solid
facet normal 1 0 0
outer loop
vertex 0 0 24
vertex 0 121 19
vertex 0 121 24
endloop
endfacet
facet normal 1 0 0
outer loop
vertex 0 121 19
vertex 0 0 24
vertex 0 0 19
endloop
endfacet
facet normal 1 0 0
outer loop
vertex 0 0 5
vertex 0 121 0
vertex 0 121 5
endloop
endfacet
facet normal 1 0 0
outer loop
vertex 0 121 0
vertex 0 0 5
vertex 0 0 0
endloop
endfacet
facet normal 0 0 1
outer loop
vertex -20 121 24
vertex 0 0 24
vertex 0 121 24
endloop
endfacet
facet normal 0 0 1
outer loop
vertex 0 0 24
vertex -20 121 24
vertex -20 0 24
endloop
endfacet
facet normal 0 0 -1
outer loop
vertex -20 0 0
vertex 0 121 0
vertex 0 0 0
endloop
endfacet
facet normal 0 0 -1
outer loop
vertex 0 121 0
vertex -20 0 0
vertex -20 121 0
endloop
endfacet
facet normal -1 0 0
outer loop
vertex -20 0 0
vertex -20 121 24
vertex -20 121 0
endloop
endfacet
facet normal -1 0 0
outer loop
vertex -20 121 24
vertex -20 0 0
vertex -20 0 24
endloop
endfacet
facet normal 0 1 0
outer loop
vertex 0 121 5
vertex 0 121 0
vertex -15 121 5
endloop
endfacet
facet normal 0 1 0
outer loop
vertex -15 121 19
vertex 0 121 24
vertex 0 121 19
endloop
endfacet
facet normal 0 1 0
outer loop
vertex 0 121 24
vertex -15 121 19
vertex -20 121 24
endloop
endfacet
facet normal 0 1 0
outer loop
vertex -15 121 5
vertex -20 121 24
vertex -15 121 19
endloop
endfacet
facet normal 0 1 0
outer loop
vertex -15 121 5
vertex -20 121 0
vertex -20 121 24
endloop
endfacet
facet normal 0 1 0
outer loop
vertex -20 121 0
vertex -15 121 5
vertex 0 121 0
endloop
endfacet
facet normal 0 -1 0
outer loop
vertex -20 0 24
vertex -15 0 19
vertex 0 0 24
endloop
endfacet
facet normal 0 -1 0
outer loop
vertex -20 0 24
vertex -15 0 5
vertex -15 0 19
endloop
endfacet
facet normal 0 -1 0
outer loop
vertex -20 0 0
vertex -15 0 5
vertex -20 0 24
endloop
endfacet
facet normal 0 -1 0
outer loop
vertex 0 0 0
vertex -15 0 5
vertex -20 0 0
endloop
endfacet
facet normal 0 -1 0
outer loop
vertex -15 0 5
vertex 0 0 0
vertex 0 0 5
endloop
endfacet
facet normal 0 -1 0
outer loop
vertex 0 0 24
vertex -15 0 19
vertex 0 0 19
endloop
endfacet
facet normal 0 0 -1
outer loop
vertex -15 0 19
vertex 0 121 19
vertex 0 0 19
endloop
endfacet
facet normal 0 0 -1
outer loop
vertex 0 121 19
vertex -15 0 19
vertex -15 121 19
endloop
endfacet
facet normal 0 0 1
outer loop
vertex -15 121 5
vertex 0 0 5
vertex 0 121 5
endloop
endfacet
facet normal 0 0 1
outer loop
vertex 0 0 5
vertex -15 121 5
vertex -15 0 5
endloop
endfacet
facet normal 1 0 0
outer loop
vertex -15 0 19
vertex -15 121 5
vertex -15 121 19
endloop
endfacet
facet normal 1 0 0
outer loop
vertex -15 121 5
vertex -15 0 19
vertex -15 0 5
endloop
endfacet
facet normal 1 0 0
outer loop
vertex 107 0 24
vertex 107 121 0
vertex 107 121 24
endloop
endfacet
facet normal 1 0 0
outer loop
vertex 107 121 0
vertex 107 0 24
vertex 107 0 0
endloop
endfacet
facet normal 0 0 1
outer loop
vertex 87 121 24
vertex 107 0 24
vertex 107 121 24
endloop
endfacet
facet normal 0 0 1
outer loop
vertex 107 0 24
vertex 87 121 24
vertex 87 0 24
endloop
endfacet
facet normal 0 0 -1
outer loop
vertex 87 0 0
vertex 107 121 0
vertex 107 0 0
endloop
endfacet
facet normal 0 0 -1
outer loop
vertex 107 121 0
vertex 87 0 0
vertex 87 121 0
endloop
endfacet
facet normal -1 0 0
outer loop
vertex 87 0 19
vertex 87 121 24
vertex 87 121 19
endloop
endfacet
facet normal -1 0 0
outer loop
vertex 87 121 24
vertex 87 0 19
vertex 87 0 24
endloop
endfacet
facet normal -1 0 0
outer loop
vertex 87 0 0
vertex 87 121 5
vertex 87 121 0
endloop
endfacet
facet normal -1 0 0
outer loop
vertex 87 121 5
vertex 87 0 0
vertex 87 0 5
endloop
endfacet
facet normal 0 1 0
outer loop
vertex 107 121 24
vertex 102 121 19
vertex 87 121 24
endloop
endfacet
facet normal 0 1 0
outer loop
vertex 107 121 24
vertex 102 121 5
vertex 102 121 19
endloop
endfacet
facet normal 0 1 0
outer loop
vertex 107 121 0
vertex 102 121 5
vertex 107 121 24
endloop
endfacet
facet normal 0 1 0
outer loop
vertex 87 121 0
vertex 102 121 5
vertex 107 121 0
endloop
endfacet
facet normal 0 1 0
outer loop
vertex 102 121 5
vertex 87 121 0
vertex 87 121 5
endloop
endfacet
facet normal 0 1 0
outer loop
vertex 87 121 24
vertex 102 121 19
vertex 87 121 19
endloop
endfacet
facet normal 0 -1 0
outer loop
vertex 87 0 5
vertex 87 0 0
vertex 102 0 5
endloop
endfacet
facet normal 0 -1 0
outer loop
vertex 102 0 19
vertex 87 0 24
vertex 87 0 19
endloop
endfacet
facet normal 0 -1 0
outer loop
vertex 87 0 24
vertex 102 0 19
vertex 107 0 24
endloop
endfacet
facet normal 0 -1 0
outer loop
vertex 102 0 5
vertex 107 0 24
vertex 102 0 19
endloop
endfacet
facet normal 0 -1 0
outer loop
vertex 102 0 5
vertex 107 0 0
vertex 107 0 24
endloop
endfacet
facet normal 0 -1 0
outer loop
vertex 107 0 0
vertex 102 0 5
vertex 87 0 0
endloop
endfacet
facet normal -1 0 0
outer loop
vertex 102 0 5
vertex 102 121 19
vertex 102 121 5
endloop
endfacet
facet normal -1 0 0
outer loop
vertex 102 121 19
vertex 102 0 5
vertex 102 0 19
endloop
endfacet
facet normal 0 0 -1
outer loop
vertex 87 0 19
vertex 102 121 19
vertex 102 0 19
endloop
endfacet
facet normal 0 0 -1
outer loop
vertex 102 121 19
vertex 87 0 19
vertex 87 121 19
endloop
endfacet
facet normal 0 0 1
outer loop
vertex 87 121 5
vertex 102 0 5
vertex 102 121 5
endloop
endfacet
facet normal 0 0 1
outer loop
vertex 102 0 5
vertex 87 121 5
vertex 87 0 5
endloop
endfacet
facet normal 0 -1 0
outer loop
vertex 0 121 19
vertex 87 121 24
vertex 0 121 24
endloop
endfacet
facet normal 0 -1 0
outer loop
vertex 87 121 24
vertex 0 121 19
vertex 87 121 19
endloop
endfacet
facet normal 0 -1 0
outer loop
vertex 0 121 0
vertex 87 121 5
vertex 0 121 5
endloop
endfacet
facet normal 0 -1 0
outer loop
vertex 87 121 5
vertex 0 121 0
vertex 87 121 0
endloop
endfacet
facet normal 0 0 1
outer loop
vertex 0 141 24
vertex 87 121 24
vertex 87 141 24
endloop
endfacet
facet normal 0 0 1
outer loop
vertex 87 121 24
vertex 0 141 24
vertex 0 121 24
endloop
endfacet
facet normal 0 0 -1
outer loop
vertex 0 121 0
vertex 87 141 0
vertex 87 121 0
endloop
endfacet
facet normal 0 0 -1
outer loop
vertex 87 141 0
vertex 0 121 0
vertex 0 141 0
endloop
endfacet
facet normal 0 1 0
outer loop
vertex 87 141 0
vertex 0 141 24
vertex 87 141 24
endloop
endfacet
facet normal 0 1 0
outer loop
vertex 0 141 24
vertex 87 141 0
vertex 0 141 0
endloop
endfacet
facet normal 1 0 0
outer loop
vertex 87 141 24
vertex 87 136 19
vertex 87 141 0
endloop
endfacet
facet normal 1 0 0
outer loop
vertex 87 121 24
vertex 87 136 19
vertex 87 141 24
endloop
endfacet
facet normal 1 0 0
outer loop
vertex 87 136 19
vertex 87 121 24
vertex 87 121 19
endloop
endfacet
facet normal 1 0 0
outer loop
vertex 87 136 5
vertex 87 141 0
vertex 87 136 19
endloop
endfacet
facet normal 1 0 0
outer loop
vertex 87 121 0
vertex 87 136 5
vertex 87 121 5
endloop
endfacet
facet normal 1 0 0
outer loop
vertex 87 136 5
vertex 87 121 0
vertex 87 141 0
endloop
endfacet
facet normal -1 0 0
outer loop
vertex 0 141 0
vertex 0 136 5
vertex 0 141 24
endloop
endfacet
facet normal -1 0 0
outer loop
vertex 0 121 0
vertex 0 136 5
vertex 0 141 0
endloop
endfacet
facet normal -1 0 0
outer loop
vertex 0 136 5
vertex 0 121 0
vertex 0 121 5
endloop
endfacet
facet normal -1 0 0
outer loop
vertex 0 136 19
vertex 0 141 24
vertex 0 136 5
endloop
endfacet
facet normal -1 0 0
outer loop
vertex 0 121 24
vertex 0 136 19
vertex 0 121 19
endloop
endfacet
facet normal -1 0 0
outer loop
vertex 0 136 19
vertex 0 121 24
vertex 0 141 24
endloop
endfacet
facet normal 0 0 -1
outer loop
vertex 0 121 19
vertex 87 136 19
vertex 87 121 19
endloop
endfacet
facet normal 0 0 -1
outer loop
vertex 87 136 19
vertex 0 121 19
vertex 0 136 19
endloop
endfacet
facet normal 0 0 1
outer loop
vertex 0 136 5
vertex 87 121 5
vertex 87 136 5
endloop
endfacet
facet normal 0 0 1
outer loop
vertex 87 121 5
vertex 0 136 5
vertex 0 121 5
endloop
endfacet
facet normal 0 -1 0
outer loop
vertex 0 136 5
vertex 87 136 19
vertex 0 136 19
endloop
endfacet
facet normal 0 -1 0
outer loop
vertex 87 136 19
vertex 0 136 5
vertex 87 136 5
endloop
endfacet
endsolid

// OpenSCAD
// file: config.scad
// Konfigurationsdatei mit allen gemeinsamen Variablen

// Grundlegende Konfiguration
ANZAHL_OBJEKTE = 4;

// Farben und Transparenz
FARBE_RAHMEN = "grey";     
FARBE_GITTER = "blue";    
FARBE_BOHRUNG = "red";    
FARBE_KABEL = "yellow";
ALPHA_RAHMEN = 0.8;
ALPHA_GITTER = 1;
ALPHA_BOHRUNG = 0.5;

// Rendering-Kontrolle
RENDER_FIX = 0.1;

// Hauptabmessungen
LAENGE = 121;
BREITE = 87;
HOEHE = 24;
WANDSTAERKE = 5;

// Gitterparameter
REIHEN = 6;
SPALTEN = 4;
ZELLGROESSE = 20;
ABSTAND_X = 20;
ABSTAND_Y = 20;
GITTERDICKE = 4;

// Kabelführungsparameter
KABEL_BREITE = 15;

// Vorberechnete Werte
RADIUS = ZELLGROESSE / (2 * cos(22.5));
OKTAGON_PUNKTE = [for(i = [0:7]) [RADIUS * cos(i * 45 + 22.5), RADIUS * sin(i * 45 + 22.5)]];
INNERER_RADIUS = (ZELLGROESSE - 2 * GITTERDICKE) / (2 * cos(22.5));
INNERE_PUNKTE = [for(i = [0:7]) [INNERER_RADIUS * cos(i * 45 + 22.5), INNERER_RADIUS * sin(i * 45 + 22.5)]];

// Bohrungsmaße
BOHRUNG_BREITE = BREITE - 2 * WANDSTAERKE;
BOHRUNG_TIEFE = LAENGE - WANDSTAERKE;
BOHRUNG_HOEHE = HOEHE - 2 * WANDSTAERKE;

// Hilfsfunktionen
function berechneOffset(rahmenGroesse, gitterGroesse, abstand, anzahl) =
    gitterGroesse / 2 + (rahmenGroesse - anzahl * abstand) / 2;
// main file
// kabelfuehrung.scad
// Module für die drei Kabelführungstypen
include <config.scad>

module kabelLinks() {
    color(FARBE_KABEL)
    difference() {
        cube([KABEL_BREITE + WANDSTAERKE, LAENGE, HOEHE]);
        translate([WANDSTAERKE, -1, WANDSTAERKE])
            cube([KABEL_BREITE, LAENGE + 2, HOEHE - 2*WANDSTAERKE]);
    }
}

module kabelRechts() {
    color(FARBE_KABEL)
    difference() {
        cube([KABEL_BREITE + WANDSTAERKE, LAENGE, HOEHE]);
        translate([0, -1, WANDSTAERKE])
            cube([KABEL_BREITE, LAENGE + 2, HOEHE - 2*WANDSTAERKE]);
    }
}

module kabelHinten() {
    color(FARBE_KABEL)
    difference() {
        cube([KABEL_BREITE + WANDSTAERKE, BREITE, HOEHE]);
        translate([WANDSTAERKE, -1, WANDSTAERKE])
            cube([KABEL_BREITE, BREITE + 2, HOEHE - 2*WANDSTAERKE]);
    }
}

// Hauptmodul das immer gerendert wird
module alleKabel() {
    translate([-KABEL_BREITE - WANDSTAERKE, 0, 0])
        kabelLinks();
    
    translate([BREITE, 0, 0])
        kabelRechts();
    
    translate([0, LAENGE + 20, 0])
        rotate([0, 0, -90])
        kabelHinten();
}

// Direkte Ausführung des Hauptmoduls
alleKabel();
